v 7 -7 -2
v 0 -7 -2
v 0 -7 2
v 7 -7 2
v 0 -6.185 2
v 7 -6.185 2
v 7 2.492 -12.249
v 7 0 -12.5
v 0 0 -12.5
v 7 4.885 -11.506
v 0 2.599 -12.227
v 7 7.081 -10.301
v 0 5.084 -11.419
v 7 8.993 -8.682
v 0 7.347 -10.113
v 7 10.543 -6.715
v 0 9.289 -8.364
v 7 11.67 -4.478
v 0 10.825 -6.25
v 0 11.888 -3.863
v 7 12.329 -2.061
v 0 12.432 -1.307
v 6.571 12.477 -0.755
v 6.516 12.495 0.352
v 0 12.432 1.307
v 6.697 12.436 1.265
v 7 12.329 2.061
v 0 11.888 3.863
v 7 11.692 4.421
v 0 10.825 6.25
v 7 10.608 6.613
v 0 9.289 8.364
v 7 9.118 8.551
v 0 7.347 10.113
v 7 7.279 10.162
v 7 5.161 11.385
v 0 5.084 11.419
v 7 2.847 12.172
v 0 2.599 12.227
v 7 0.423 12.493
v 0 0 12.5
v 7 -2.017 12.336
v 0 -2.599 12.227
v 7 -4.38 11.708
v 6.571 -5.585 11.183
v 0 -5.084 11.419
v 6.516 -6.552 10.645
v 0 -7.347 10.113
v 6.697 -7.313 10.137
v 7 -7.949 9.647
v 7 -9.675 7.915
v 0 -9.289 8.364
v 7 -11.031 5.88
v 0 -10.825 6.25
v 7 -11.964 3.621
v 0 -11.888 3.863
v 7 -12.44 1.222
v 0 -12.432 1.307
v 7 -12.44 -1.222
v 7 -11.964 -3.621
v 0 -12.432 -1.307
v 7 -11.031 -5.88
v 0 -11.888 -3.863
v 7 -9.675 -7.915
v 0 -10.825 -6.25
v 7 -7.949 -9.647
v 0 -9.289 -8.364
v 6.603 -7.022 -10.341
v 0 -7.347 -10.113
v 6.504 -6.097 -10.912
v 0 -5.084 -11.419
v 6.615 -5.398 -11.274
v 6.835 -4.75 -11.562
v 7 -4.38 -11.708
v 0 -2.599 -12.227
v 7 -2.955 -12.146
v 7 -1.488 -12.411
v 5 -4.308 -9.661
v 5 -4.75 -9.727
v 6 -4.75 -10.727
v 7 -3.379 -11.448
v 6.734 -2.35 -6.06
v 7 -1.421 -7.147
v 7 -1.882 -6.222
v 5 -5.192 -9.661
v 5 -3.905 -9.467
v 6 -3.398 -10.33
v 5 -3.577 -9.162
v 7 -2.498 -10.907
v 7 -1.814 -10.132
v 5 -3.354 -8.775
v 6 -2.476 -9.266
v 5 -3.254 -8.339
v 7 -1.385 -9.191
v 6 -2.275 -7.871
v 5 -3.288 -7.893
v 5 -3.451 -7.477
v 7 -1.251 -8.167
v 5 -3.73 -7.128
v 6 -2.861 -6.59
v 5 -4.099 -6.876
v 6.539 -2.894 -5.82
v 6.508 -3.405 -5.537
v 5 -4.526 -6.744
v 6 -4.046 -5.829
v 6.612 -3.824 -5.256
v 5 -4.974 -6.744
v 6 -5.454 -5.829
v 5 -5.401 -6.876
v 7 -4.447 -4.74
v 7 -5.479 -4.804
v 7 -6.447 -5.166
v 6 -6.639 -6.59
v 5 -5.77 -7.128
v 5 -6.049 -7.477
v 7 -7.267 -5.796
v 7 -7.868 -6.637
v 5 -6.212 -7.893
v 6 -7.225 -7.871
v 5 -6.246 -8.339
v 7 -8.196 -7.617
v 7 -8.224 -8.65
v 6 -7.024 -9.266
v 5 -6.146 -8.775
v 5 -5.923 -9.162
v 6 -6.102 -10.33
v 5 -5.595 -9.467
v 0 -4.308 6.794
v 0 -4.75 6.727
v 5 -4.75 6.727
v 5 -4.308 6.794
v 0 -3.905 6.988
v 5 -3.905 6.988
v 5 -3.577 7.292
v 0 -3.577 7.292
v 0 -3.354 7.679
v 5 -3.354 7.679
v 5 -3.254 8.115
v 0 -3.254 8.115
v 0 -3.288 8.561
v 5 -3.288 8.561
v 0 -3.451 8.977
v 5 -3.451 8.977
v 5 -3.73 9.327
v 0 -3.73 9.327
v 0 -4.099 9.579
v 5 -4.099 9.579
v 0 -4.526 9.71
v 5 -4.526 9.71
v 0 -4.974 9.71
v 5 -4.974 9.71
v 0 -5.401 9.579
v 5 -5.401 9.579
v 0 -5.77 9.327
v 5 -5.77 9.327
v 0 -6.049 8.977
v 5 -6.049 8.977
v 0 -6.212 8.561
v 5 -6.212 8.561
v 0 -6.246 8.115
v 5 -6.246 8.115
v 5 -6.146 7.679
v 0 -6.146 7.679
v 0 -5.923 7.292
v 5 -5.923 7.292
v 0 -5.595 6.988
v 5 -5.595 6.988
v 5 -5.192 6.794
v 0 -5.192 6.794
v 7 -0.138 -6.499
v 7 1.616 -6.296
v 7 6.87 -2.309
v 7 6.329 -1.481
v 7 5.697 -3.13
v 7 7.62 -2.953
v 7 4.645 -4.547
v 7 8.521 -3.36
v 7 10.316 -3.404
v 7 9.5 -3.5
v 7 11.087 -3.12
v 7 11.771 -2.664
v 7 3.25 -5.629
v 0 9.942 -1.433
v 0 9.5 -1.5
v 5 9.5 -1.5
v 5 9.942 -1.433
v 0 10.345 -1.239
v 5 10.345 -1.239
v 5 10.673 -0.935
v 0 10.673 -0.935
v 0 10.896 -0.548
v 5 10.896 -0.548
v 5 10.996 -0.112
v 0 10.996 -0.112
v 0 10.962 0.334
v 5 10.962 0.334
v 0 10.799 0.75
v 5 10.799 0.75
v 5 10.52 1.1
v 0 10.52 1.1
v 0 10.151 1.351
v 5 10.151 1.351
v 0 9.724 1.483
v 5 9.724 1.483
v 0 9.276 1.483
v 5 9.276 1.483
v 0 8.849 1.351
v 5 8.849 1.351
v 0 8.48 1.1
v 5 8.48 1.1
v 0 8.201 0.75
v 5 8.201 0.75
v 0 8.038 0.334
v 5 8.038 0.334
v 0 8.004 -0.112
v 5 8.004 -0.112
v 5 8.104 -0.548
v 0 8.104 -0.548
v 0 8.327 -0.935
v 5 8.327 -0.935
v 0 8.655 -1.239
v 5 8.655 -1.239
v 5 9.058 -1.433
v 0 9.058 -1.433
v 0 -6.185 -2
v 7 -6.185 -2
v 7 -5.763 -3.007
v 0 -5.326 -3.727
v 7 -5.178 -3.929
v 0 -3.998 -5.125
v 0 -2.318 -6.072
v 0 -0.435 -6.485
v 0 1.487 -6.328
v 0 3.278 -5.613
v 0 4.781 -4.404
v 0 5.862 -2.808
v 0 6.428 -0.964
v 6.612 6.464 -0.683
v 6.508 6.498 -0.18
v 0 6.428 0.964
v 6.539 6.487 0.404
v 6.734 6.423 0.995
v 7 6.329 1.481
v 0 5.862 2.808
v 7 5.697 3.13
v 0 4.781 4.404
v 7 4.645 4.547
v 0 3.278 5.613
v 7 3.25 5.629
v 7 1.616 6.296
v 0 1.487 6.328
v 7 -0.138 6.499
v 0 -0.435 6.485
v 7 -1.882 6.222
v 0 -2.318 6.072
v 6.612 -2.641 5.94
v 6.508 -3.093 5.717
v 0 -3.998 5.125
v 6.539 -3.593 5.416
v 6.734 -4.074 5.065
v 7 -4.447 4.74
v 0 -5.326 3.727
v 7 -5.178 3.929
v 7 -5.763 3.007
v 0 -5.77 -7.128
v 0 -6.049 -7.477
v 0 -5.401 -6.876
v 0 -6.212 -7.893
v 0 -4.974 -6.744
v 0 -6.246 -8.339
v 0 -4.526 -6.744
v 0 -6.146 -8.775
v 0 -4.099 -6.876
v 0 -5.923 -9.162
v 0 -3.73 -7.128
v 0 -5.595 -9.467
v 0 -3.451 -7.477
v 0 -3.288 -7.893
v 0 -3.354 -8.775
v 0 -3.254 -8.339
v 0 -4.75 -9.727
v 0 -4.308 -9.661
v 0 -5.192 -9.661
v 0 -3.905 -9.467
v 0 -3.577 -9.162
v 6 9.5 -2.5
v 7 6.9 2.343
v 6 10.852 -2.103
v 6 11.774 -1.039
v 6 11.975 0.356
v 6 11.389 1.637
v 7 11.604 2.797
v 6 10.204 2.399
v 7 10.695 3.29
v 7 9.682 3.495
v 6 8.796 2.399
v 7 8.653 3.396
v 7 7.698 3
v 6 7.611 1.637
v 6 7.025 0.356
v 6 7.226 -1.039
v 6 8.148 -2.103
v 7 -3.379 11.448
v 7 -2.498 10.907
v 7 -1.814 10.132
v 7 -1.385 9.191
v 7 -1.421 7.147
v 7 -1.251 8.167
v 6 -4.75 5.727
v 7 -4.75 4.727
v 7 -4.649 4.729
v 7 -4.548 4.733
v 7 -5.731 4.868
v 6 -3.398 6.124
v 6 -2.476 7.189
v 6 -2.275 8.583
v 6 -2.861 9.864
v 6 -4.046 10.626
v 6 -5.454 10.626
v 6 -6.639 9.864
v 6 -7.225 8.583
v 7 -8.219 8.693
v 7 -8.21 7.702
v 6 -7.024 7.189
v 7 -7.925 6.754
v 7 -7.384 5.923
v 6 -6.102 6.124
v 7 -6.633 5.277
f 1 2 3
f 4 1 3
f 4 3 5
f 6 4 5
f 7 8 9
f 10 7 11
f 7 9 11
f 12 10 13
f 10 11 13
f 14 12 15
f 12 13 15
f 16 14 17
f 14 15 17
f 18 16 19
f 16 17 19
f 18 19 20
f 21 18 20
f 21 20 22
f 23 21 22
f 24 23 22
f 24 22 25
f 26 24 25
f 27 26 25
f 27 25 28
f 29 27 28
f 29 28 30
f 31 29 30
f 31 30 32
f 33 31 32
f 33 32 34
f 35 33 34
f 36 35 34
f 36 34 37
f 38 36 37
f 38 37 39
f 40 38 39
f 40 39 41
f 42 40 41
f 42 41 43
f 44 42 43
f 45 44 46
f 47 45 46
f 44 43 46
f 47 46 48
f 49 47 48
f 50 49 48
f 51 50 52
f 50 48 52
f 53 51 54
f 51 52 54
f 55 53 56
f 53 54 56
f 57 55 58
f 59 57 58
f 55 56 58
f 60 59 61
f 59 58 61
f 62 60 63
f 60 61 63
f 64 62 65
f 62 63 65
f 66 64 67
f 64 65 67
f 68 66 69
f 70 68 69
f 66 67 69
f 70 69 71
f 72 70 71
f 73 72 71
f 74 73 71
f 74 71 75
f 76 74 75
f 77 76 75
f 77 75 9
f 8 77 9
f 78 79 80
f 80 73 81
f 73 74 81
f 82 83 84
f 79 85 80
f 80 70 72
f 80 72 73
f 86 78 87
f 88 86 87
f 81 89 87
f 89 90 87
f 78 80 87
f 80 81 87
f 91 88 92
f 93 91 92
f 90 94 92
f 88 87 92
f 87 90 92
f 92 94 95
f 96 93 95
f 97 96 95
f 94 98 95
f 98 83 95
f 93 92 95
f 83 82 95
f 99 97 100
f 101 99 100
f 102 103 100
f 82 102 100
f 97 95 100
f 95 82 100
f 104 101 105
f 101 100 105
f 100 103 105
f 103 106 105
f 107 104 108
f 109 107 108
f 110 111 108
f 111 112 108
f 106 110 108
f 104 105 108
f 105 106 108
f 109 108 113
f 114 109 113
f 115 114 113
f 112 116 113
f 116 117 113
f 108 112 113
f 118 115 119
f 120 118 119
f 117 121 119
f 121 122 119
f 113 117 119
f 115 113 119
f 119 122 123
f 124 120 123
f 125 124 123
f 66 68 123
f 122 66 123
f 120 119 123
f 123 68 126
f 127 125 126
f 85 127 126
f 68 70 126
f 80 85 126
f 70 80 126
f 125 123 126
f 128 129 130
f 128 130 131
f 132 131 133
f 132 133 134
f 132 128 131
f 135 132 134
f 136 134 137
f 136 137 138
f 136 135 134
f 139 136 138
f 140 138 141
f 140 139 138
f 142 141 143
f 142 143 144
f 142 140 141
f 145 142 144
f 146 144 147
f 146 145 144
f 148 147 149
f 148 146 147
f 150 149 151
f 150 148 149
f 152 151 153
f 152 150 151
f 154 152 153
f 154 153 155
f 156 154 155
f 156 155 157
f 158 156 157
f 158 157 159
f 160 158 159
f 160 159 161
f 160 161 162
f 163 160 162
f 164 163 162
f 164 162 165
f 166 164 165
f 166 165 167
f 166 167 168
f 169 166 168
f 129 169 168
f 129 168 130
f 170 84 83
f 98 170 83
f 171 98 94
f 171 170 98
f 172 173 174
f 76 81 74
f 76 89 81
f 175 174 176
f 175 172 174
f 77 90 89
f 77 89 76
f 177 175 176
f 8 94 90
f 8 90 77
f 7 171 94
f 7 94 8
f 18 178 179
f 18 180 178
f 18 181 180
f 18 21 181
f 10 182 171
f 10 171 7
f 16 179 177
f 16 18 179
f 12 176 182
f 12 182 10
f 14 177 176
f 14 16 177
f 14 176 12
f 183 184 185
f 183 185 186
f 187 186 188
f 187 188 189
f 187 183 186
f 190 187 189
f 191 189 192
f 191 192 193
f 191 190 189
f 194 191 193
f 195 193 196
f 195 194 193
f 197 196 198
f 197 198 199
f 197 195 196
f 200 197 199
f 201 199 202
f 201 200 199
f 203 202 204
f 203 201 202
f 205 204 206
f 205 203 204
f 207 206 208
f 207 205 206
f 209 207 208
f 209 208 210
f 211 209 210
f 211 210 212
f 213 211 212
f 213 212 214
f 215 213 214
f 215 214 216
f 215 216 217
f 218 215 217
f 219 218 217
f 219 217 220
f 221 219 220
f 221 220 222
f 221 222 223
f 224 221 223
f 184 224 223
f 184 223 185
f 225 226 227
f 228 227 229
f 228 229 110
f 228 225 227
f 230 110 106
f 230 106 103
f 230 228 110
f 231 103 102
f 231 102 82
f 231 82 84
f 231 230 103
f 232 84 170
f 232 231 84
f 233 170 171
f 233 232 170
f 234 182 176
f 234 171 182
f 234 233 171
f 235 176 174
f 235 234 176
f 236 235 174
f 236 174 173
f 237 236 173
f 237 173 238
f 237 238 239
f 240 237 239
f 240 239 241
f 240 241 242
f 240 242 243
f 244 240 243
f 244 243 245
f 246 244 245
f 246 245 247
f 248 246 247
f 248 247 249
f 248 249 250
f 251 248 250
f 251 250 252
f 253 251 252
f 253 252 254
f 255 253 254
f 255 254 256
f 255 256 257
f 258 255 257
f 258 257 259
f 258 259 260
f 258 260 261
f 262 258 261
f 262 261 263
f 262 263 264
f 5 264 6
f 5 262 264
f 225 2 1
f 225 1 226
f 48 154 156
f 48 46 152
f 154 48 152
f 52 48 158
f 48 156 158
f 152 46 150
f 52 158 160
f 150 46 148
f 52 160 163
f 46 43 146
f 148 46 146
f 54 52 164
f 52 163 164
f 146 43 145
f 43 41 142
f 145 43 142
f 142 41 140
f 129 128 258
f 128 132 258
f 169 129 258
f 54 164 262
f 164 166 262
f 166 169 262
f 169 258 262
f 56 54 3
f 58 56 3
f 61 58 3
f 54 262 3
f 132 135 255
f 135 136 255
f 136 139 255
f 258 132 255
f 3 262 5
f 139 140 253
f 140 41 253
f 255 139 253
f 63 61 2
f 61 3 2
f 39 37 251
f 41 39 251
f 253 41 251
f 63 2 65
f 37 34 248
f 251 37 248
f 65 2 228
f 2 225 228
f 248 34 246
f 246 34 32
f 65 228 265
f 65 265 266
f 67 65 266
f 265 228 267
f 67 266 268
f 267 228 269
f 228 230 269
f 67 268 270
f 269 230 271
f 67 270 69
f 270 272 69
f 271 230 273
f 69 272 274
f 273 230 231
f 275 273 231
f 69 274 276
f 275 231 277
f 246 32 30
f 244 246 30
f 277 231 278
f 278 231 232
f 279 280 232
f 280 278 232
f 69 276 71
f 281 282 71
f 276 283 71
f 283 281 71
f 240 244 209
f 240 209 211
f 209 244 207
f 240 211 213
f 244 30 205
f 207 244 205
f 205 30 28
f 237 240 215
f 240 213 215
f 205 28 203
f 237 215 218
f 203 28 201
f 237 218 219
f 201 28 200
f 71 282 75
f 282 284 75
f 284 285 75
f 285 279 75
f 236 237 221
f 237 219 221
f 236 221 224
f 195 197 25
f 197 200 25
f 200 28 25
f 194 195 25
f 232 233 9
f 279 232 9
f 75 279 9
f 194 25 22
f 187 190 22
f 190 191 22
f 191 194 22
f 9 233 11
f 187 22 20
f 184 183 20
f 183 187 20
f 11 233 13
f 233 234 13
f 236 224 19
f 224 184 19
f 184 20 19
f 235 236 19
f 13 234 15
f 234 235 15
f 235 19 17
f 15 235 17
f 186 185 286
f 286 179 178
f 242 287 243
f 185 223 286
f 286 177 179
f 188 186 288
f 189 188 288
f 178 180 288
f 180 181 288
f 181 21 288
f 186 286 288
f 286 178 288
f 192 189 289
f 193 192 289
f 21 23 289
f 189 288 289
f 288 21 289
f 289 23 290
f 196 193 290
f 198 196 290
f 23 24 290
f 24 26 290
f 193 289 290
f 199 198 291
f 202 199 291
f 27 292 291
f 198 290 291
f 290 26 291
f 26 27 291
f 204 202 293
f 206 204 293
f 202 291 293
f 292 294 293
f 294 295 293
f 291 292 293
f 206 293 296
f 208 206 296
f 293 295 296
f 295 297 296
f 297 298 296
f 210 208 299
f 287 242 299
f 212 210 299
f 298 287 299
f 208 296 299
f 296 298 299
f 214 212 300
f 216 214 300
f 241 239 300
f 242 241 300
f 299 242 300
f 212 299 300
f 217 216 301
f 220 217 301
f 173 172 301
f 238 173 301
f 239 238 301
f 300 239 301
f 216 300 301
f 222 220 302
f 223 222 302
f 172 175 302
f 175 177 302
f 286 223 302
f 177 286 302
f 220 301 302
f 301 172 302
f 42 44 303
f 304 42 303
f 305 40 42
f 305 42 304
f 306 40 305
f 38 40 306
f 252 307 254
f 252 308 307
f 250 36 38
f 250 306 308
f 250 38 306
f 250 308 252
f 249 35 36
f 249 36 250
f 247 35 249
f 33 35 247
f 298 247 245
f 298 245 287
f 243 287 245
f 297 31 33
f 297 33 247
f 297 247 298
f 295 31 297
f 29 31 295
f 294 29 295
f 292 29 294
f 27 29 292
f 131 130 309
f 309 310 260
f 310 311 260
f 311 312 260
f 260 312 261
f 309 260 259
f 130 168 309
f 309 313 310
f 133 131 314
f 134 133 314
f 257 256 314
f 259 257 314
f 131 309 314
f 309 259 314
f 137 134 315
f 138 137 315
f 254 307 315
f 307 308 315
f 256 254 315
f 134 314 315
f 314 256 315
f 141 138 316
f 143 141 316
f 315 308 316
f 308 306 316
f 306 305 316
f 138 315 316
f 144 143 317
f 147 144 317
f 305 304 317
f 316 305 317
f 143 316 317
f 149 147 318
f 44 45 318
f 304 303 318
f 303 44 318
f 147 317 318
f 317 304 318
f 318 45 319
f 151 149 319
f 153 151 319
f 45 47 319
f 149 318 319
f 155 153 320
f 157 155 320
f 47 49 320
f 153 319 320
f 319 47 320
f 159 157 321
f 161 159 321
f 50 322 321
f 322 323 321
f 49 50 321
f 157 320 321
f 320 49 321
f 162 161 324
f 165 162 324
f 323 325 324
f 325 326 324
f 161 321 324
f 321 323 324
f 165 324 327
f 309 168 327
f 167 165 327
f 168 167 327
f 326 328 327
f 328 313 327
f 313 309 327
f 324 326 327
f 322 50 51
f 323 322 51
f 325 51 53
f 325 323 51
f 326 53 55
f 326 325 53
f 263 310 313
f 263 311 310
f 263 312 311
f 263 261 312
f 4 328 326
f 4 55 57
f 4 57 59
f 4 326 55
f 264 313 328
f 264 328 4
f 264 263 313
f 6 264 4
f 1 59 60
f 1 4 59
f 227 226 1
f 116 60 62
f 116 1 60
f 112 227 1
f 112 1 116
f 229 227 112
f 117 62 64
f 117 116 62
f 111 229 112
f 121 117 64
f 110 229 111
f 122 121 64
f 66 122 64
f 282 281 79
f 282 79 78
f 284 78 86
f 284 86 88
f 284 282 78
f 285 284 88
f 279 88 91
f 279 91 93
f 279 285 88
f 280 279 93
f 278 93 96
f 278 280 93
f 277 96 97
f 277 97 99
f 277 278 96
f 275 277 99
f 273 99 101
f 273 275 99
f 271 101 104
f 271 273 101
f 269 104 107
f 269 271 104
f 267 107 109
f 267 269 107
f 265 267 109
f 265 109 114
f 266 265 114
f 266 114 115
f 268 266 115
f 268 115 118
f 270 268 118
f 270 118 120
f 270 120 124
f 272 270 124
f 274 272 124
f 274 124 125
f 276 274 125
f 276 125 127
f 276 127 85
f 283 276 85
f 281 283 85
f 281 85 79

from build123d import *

# Parameters (mm, degrees)
SKETCH1_R           = 12.5
SKETCH1_R_2         = 6.5
SKETCH1_R_3         = 1.5
BOSS_EXTRUDE1_DEPTH = 7
CHAMFER1_SIZE       = 2
SKETCH2_W           = 4
SKETCH2_H           = 4
CUT_EXTRUDE1_DEPTH  = 10


with BuildPart() as part:
    # Sketch1 → Boss-Extrude1 (new body)
    with BuildSketch(Plane(origin=(0, 0, 0), x_dir=(0, 0, -1), z_dir=(1, 0, 0))):
        Circle(SKETCH1_R)
        Circle(SKETCH1_R_2, mode=Mode.SUBTRACT)
        with Locations((0, 9.5)):
            Circle(SKETCH1_R_3, mode=Mode.SUBTRACT)
        with Locations((-8.227241336, -4.75)):
            Circle(SKETCH1_R_3, mode=Mode.SUBTRACT)
        with Locations((8.227241336, -4.75)):
            Circle(SKETCH1_R_3, mode=Mode.SUBTRACT)
    extrude(amount=BOSS_EXTRUDE1_DEPTH)

    # Chamfer1
    # the kernel refuses this chamfer: 2 mm, written as the material it takes off along each edge
    with BuildSketch(Plane(origin=(7, -4.75, 8.227241336), x_dir=(0, 0, -1), z_dir=(0, -1, 0))) as chamfer1_piece_1:
        Polygon((1.5, -CHAMFER1_SIZE), (1.5 + CHAMFER1_SIZE, 0), (1.5, 0), align=None)
    revolve(axis=Axis((7, -4.75, 8.227241336), (1, 0, 0)), mode=Mode.SUBTRACT)
    with BuildSketch(Plane(origin=(7, -4.75, -8.227241336), x_dir=(0, 0, -1), z_dir=(0, -1, 0))) as chamfer1_piece_2:
        Polygon((1.5, -CHAMFER1_SIZE), (1.5 + CHAMFER1_SIZE, 0), (1.5, 0), align=None)
    revolve(axis=Axis((7, -4.75, -8.227241336), (1, 0, 0)), mode=Mode.SUBTRACT)
    with BuildSketch(Plane(origin=(7, 9.5, 0), x_dir=(0, 0, -1), z_dir=(0, -1, 0))) as chamfer1_piece_3:
        Polygon((1.5, -CHAMFER1_SIZE), (1.5 + CHAMFER1_SIZE, 0), (1.5, 0), align=None)
    revolve(axis=Axis((7, 9.5, 0), (1, 0, 0)), mode=Mode.SUBTRACT)

    # Sketch2 → Cut-Extrude1 (cut)
    with BuildSketch(Plane.ZY):
        with Locations((0, -5)):
            Rectangle(SKETCH2_W, SKETCH2_H)
    extrude(amount=-CUT_EXTRUDE1_DEPTH, mode=Mode.SUBTRACT)


solid = part.part
